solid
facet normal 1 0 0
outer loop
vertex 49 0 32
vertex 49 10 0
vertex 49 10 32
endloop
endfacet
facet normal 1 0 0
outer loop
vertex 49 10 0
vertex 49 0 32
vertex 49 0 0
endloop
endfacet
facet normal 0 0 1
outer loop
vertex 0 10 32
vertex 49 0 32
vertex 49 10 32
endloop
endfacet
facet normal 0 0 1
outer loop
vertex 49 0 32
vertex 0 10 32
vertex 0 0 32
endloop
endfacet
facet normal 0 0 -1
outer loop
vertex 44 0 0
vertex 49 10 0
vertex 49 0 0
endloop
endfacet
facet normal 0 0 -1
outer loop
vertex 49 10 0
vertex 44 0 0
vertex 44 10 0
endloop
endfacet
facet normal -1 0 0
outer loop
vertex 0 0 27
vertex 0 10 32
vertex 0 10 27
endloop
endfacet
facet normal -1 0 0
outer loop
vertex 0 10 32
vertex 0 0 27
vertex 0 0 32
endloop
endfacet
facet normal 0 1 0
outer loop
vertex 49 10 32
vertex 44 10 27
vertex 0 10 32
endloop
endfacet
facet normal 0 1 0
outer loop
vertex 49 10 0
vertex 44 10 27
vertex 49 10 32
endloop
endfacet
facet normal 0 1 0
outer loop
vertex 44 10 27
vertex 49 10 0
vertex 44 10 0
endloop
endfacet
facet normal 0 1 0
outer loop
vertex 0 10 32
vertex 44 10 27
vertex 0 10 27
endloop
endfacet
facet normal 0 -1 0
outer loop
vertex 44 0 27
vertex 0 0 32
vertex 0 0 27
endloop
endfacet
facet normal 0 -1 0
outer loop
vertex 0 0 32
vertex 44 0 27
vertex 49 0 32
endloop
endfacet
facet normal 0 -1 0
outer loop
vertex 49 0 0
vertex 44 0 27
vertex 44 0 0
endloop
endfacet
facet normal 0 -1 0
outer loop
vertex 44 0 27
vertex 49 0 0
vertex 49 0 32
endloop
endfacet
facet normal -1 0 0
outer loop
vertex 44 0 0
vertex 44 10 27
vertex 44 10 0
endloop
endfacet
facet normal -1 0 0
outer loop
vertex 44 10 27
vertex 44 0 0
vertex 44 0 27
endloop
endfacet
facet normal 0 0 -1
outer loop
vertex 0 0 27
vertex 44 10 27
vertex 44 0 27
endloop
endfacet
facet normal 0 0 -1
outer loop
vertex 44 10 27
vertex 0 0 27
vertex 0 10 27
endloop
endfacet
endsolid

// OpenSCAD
cbeam_height = 27;
cbeam_width = 44;
cbeam_support_thickness = 5;
cbeam_support_depth = 10;
leg_support_width = 0;
leg_support_height = 0;

union(){
    difference() {
        cube([cbeam_width + cbeam_support_thickness,
        cbeam_support_depth,
        cbeam_height + cbeam_support_thickness]);
        translate(cbeam_support_thickness, cbeam_support_thickness, 0){
            cube([cbeam_width,
            cbeam_support_depth+10,
            cbeam_height]);
        }
    }
}
